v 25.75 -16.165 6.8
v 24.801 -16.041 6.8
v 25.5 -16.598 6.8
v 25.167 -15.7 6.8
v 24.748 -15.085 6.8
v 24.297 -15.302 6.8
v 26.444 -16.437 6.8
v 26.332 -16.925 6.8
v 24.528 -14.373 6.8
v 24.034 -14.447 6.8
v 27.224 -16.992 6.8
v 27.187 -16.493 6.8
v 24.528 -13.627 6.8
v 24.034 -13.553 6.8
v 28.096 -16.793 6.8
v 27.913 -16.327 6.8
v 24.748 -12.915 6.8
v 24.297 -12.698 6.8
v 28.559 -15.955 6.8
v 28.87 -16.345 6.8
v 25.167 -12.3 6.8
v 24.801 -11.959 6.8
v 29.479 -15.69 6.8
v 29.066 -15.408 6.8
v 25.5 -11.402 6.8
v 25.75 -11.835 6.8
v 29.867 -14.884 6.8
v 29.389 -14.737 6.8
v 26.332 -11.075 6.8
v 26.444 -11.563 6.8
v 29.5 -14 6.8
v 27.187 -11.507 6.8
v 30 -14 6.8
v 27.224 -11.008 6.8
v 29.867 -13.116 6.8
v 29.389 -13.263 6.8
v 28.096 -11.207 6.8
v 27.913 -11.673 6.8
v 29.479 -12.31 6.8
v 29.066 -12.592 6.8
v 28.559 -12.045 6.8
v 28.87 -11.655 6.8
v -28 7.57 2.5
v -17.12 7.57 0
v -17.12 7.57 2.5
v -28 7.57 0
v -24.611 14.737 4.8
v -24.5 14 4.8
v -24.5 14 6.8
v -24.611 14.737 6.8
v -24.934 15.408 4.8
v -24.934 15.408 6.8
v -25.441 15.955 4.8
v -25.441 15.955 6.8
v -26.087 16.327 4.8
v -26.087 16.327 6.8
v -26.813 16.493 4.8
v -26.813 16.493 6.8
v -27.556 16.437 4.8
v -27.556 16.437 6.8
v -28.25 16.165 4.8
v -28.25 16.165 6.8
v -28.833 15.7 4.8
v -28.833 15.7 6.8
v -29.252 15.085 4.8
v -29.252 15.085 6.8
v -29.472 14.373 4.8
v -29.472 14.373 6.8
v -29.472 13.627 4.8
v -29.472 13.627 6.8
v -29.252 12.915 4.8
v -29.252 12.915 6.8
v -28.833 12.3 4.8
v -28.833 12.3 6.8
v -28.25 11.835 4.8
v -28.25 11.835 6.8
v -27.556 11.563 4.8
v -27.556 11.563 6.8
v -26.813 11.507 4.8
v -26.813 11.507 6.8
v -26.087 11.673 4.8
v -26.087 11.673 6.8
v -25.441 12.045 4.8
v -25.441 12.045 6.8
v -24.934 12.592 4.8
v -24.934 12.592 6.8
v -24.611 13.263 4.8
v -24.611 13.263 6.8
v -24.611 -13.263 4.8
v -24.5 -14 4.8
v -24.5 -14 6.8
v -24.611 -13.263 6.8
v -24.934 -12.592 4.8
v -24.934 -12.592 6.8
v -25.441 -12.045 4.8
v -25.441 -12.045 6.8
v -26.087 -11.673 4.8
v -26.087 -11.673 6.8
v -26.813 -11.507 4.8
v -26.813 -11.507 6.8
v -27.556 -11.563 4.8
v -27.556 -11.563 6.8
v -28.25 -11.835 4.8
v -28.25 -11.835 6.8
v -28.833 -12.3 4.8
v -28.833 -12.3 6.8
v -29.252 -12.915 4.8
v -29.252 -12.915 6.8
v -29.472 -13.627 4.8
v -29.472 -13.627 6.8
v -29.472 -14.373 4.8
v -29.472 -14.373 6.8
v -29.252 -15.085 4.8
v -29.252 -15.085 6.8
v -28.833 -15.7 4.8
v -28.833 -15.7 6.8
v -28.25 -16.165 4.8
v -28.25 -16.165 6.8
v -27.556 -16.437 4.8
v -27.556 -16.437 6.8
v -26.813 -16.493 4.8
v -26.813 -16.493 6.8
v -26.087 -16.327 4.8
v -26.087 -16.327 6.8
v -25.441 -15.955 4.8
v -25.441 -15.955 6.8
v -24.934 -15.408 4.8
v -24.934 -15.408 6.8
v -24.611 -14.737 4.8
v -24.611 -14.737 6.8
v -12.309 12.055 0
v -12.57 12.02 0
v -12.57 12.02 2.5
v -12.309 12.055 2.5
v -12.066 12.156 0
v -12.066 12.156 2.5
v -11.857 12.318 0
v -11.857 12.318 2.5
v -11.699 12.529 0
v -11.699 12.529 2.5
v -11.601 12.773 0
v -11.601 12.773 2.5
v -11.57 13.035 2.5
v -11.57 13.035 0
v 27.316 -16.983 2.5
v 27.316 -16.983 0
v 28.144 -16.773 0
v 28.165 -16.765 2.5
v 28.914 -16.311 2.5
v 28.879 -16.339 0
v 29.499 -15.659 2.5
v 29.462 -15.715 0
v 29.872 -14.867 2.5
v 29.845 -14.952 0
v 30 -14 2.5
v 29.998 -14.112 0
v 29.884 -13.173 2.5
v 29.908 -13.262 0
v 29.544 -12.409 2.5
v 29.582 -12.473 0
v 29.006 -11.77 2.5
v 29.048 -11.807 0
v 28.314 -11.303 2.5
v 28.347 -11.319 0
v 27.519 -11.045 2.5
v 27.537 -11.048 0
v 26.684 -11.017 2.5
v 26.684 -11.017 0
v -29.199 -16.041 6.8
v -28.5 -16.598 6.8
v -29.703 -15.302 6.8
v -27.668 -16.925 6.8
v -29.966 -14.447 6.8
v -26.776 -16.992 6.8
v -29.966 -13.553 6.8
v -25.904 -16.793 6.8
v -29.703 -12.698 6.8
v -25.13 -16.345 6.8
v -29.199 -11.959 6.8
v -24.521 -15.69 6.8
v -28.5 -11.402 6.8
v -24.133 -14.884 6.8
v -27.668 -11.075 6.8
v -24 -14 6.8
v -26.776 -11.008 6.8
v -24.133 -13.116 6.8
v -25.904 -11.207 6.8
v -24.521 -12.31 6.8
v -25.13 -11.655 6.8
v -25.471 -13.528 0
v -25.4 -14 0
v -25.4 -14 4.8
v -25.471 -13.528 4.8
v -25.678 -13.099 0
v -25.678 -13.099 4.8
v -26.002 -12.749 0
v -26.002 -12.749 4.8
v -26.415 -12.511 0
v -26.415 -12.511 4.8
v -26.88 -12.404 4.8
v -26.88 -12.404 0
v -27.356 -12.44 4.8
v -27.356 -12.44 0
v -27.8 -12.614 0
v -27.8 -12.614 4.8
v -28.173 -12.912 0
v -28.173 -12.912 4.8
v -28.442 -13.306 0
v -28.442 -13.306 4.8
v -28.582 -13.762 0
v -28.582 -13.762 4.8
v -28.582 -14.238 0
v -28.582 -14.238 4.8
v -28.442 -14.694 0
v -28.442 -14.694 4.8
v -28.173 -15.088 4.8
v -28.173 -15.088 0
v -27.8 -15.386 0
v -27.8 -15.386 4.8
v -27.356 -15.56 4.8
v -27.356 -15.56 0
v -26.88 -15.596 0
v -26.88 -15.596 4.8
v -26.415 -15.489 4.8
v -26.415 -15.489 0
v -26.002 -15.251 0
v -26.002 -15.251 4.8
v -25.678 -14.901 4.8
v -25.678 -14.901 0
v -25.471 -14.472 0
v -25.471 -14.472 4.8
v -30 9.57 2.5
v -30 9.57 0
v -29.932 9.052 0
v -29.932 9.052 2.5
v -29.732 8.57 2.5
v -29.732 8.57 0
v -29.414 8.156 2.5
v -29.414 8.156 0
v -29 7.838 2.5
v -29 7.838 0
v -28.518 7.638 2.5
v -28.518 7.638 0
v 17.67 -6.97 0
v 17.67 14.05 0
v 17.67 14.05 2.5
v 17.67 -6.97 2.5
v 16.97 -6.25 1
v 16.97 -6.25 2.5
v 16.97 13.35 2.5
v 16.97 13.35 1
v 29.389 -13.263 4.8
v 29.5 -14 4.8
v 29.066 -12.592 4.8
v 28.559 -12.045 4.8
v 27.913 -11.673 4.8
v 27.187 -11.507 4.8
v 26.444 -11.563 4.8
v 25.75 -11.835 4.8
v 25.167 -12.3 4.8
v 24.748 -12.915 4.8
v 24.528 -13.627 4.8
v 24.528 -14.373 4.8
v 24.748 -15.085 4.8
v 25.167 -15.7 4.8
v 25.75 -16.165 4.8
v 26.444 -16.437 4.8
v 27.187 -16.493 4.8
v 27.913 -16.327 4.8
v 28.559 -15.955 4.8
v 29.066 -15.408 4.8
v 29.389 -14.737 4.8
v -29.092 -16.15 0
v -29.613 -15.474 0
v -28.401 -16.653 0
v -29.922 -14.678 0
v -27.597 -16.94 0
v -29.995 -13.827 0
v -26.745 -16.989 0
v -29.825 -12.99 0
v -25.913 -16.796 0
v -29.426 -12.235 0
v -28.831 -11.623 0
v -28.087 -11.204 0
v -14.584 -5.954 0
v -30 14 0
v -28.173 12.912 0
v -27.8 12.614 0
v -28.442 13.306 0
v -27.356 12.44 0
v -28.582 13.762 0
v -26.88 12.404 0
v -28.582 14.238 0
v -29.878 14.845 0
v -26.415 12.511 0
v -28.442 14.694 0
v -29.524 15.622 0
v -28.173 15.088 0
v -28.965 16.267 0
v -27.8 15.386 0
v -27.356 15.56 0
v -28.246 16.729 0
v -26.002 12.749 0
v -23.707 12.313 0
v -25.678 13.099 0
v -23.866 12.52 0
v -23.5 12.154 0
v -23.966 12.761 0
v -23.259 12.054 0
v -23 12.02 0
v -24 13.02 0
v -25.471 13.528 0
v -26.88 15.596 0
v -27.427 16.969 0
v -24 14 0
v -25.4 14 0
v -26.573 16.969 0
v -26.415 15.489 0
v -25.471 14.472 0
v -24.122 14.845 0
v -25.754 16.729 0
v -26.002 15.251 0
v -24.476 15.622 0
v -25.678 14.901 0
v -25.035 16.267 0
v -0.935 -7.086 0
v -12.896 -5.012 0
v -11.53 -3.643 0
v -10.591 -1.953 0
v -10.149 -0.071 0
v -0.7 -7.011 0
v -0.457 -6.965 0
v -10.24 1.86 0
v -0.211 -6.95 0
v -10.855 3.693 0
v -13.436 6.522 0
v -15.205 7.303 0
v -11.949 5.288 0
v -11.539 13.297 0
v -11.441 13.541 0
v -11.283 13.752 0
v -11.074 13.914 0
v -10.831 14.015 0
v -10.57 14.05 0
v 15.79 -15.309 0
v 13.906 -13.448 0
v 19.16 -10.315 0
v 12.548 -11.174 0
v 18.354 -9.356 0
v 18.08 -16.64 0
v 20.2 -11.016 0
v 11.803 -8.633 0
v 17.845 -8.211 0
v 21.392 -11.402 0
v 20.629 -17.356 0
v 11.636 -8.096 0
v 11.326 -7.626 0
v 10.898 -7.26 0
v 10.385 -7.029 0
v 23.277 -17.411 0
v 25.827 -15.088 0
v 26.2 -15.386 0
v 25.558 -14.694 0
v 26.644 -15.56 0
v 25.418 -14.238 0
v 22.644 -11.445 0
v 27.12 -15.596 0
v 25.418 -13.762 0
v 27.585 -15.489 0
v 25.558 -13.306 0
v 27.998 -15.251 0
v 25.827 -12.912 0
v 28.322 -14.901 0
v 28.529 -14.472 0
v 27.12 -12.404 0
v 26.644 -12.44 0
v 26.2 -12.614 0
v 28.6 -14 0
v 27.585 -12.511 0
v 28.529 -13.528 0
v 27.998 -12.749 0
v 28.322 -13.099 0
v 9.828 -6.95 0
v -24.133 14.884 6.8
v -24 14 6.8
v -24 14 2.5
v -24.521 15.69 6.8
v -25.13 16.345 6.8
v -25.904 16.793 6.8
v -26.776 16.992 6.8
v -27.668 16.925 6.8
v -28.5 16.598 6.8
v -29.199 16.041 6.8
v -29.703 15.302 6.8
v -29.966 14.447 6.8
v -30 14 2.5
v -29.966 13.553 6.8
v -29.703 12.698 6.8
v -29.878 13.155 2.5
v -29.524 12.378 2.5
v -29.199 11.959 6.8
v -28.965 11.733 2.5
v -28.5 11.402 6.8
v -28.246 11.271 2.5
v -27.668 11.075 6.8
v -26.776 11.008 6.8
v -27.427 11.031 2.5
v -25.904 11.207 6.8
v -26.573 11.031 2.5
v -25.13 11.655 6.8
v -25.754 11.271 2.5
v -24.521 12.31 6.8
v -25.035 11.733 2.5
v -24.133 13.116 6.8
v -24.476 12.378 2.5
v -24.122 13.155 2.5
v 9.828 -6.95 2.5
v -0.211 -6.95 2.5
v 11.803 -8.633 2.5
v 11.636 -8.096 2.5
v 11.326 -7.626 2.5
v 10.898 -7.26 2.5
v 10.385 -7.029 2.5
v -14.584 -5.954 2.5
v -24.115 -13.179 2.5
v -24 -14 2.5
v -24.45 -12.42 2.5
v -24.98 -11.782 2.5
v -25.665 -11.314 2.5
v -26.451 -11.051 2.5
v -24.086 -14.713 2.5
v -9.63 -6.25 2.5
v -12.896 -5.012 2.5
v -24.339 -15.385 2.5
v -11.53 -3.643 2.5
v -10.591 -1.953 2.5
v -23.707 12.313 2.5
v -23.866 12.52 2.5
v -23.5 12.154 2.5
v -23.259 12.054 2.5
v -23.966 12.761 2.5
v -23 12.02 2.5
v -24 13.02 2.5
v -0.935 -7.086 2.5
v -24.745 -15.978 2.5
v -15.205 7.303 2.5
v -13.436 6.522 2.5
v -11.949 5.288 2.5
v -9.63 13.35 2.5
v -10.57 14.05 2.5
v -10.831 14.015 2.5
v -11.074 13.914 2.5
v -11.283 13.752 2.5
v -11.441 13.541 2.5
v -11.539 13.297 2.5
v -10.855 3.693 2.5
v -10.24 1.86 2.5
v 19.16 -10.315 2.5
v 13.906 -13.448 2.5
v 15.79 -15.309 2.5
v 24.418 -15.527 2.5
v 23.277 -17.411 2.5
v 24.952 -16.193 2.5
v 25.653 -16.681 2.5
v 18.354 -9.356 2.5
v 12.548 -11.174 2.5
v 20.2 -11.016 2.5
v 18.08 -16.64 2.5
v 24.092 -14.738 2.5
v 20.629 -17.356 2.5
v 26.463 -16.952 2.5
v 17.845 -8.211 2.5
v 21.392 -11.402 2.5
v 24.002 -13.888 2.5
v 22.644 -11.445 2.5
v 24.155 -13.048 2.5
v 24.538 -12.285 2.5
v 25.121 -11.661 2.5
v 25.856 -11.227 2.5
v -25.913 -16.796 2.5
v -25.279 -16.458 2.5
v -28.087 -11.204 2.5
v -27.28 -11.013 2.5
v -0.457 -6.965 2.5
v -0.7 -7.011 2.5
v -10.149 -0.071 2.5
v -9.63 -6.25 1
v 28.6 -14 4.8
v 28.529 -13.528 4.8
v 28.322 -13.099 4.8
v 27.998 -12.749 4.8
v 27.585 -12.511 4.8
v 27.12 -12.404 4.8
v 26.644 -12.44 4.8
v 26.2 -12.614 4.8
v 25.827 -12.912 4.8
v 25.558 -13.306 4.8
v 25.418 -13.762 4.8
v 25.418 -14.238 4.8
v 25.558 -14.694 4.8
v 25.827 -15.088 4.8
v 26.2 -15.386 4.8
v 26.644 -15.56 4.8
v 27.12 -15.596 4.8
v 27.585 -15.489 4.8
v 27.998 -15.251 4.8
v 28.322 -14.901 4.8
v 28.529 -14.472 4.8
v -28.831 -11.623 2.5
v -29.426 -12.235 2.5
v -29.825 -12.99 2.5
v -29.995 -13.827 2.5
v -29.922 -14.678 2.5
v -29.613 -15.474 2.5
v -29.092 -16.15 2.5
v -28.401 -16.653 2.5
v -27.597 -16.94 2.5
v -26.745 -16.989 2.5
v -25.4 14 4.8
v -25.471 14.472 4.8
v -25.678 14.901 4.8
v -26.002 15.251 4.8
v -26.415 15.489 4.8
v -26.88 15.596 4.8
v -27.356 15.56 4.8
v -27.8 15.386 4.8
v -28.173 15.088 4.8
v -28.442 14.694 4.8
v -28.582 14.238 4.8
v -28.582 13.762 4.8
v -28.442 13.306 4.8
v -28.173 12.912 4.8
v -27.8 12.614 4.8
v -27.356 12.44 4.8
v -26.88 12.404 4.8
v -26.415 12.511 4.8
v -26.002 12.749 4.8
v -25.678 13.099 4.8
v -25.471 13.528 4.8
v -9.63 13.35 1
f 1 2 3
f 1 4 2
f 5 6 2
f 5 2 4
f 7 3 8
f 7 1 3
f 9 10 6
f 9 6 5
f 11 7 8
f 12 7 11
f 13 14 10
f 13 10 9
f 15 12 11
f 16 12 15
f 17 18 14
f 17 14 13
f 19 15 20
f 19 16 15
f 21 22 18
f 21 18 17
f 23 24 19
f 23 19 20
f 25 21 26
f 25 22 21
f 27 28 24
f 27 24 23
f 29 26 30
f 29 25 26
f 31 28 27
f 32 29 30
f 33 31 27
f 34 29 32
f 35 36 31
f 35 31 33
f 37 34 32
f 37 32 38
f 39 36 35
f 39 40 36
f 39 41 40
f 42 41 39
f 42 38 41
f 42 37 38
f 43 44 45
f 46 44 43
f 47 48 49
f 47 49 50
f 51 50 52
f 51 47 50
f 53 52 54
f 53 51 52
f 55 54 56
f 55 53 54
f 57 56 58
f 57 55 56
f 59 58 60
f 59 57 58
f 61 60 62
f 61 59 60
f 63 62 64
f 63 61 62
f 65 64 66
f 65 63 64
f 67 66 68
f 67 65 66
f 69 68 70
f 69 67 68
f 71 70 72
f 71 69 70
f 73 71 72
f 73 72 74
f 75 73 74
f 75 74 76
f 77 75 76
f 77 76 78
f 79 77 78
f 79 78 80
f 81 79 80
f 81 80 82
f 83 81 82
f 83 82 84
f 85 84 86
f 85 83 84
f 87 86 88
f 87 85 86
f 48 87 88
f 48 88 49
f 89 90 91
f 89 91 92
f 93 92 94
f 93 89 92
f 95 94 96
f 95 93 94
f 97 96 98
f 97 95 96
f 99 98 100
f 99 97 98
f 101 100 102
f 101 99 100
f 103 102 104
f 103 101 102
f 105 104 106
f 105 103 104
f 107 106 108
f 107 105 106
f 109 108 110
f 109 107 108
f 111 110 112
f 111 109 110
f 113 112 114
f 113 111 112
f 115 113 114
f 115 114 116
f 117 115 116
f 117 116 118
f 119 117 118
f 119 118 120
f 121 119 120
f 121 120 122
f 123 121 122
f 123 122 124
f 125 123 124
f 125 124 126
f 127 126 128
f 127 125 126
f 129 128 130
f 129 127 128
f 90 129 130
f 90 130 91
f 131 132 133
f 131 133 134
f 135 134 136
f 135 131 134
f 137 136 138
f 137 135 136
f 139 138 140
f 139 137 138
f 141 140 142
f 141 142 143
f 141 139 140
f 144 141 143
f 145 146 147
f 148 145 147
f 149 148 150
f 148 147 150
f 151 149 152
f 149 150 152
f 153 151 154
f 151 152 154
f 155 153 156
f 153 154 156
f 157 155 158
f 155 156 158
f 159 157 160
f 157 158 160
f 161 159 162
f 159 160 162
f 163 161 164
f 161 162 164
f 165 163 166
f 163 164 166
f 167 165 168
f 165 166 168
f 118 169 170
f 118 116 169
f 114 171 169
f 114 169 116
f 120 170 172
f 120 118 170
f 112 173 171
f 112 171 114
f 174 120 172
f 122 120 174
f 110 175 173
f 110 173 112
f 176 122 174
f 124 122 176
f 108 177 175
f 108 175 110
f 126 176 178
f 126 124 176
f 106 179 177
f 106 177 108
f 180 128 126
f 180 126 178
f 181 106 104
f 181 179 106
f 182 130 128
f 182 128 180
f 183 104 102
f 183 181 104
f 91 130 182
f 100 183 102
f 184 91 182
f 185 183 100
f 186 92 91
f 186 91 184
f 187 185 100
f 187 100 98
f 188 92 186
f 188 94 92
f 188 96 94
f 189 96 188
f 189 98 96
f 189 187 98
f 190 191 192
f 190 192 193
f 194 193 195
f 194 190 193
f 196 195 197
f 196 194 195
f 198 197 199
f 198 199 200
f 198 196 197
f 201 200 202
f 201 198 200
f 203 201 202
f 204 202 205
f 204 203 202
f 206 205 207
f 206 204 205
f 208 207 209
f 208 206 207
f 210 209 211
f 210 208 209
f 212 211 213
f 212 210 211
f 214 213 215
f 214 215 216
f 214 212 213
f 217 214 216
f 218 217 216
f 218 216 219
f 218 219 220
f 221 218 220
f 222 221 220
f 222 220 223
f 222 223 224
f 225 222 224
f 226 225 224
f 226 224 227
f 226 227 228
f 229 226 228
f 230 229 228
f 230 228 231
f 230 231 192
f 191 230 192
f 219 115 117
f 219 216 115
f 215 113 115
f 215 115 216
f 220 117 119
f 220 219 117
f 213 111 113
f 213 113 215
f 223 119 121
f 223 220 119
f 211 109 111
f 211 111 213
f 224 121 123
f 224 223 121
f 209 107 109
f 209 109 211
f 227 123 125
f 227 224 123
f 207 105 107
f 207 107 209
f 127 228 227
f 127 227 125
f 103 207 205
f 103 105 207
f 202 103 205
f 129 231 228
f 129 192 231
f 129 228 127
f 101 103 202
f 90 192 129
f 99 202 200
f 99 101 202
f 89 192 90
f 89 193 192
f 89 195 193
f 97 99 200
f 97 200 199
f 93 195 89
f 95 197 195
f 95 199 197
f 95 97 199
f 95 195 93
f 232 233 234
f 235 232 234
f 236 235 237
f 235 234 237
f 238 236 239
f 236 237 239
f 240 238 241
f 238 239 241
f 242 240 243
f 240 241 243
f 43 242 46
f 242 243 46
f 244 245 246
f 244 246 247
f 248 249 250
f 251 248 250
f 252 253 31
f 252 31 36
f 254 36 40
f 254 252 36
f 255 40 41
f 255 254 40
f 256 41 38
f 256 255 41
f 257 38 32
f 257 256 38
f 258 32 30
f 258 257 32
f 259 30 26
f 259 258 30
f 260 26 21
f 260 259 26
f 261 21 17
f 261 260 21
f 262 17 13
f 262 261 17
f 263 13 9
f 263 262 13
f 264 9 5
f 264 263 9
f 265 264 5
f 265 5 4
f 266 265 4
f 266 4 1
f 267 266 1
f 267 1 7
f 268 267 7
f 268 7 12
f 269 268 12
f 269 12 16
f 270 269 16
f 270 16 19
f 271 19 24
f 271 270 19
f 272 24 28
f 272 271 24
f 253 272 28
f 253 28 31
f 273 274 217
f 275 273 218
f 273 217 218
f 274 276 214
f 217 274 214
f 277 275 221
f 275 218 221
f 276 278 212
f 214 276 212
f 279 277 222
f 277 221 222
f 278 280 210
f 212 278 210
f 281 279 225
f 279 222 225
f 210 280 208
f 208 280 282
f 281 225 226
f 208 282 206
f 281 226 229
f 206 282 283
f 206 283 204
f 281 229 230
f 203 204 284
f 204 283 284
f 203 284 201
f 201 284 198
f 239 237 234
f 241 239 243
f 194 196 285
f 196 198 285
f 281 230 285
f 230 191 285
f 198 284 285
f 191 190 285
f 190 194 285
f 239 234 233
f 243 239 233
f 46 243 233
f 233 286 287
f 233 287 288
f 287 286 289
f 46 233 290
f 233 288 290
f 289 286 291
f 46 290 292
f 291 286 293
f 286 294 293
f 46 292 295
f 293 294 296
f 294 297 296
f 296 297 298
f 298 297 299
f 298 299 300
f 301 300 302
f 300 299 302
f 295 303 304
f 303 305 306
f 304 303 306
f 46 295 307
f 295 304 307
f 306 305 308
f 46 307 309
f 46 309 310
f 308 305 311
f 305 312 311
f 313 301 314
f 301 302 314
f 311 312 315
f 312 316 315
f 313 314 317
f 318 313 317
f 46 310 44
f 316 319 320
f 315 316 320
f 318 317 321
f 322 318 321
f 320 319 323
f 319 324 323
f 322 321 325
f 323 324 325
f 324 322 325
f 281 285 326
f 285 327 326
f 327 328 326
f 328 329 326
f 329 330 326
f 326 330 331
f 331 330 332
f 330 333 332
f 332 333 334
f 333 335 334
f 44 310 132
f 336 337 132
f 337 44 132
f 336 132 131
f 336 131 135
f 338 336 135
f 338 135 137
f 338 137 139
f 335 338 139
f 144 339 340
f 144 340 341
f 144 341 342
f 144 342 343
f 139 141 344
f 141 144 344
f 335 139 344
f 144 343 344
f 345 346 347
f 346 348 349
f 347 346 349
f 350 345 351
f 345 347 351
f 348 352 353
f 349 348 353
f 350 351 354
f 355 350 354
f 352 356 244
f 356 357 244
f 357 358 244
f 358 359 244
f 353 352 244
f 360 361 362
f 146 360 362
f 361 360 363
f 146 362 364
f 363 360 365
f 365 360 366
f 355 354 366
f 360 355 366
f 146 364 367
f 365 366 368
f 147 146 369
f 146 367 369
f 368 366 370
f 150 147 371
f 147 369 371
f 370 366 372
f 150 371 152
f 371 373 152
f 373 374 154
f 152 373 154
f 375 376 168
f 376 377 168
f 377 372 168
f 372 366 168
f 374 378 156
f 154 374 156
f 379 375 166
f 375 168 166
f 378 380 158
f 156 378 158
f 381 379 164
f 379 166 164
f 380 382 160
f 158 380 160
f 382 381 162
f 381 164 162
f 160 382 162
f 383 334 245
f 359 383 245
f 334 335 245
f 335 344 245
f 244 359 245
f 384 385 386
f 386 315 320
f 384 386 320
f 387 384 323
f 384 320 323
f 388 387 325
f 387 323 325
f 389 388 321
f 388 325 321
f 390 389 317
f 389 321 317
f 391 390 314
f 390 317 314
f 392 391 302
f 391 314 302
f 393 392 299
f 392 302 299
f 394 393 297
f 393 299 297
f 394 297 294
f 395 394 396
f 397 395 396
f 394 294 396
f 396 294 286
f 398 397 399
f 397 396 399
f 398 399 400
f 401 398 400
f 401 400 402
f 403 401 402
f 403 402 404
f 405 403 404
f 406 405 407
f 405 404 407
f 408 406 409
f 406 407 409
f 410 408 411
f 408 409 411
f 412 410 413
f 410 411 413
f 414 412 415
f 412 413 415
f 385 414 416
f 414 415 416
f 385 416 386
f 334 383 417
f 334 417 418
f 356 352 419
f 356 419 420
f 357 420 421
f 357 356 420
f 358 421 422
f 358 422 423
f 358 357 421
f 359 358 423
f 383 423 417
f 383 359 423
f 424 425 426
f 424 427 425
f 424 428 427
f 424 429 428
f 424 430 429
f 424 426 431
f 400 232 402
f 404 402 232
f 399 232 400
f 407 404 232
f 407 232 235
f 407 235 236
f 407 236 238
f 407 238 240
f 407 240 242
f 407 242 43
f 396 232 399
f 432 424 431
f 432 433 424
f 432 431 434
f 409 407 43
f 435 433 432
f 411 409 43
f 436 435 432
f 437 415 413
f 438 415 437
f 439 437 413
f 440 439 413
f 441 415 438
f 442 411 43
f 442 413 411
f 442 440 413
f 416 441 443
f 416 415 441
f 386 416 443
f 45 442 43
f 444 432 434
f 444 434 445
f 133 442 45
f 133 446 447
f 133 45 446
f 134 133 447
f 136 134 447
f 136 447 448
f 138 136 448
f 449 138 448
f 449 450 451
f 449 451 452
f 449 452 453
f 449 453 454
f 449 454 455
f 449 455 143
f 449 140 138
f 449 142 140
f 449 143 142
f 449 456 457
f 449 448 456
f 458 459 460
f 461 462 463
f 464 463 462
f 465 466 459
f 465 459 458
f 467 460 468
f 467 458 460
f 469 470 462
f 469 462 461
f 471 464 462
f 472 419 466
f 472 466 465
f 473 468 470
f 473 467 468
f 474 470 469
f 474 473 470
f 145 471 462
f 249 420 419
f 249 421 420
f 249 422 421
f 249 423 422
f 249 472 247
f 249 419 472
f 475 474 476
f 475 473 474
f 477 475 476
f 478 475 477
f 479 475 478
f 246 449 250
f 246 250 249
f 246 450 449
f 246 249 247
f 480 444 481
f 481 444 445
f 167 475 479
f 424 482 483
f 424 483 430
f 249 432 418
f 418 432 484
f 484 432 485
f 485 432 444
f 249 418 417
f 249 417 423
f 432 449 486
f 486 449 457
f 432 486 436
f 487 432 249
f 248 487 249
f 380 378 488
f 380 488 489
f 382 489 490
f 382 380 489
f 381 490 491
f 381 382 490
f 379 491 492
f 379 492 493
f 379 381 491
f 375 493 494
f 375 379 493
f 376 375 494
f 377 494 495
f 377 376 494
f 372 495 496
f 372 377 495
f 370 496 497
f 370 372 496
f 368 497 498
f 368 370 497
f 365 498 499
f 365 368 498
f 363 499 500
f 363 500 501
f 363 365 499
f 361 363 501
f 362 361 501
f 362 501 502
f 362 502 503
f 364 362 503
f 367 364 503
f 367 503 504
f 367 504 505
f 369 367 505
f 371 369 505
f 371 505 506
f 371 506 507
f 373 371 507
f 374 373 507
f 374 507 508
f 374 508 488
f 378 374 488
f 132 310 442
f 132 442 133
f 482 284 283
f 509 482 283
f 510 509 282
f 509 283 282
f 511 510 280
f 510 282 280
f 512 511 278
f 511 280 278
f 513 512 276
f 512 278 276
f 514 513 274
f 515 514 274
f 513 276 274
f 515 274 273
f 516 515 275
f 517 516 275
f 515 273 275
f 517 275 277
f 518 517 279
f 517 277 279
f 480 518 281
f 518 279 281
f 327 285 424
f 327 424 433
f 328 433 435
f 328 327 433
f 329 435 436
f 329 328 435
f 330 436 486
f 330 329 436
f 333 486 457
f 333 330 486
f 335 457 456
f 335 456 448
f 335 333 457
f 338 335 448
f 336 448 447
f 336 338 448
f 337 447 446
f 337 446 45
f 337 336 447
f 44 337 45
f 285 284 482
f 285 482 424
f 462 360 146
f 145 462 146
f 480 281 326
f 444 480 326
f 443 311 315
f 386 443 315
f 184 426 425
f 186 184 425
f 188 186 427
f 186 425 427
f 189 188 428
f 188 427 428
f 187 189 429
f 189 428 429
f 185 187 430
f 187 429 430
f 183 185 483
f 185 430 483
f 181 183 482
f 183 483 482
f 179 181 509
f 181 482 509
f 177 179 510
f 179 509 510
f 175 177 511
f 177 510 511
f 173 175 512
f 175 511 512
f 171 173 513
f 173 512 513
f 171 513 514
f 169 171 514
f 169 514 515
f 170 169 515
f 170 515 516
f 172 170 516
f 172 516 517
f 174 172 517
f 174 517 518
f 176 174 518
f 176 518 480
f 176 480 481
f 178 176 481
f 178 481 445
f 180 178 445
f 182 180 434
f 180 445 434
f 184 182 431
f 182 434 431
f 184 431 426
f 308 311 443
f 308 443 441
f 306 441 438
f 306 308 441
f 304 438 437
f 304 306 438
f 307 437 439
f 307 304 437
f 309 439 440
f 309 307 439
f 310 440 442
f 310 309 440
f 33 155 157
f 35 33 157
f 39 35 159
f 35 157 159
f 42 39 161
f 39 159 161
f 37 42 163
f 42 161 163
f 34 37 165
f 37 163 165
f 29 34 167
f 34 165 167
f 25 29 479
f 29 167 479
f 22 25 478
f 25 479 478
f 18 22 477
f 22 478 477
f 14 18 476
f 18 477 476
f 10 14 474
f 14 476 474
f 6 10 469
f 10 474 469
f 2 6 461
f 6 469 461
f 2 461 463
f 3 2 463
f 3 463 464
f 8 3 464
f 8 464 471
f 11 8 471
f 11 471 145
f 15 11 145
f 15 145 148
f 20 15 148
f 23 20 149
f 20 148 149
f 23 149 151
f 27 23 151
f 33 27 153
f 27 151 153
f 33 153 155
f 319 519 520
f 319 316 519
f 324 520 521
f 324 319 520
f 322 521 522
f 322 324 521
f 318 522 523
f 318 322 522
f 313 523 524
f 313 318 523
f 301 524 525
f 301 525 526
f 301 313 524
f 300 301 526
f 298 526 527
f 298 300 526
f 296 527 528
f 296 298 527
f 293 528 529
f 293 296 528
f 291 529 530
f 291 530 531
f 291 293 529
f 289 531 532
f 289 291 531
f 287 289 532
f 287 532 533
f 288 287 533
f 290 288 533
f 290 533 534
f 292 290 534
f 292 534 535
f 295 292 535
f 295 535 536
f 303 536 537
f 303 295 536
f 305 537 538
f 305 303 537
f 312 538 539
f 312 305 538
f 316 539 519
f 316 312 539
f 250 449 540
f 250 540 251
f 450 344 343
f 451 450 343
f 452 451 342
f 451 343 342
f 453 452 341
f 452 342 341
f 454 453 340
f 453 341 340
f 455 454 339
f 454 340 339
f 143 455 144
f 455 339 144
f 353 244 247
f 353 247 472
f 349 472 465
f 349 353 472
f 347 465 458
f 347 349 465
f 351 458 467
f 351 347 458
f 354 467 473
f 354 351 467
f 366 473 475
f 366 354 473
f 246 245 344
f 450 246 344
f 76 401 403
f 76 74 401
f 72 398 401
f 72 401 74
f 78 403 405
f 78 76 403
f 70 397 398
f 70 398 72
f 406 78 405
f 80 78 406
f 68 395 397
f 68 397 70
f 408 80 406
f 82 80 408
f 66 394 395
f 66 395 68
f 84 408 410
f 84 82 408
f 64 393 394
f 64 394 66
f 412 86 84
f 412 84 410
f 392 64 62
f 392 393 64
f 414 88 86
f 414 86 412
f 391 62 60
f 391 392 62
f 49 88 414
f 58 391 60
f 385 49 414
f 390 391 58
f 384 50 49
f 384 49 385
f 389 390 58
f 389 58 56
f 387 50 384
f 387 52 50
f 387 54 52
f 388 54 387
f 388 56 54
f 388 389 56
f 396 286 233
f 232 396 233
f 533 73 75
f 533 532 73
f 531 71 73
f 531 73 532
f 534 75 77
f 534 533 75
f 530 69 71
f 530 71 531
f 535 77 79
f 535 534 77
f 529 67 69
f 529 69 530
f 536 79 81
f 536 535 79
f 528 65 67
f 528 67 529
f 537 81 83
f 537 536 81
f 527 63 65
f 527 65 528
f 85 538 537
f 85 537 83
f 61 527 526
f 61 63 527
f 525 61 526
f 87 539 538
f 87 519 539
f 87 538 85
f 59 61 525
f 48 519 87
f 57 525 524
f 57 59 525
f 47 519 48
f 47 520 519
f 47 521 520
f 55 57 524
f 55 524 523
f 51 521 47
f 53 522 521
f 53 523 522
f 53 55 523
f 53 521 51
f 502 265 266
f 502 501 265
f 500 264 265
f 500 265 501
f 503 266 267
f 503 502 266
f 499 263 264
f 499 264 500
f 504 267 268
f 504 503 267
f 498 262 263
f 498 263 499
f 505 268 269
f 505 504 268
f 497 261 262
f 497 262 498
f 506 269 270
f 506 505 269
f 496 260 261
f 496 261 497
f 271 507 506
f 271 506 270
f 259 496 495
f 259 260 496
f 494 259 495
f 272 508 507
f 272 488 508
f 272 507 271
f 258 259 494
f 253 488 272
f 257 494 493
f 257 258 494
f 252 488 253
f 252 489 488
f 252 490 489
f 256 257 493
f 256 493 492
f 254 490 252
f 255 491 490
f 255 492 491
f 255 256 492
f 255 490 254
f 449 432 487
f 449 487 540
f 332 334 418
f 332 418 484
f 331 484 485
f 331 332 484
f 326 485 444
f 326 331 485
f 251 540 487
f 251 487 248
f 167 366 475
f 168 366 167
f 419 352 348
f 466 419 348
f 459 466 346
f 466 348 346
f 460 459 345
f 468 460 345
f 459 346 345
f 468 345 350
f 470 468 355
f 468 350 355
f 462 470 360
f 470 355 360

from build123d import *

# Parameters (mm, degrees)
SKETCH003_R   = 1.6
PAD_DEPTH     = 2.5
SKETCH_R      = 3
SKETCH_R_2    = 1.6
PAD001_DEPTH  = 2.3
SKETCH004_R   = 3
SKETCH004_R_2 = 2.5
PAD002_DEPTH  = 2
SKETCH005_W   = 26.6
SKETCH005_H   = 19.6
POCKET_DEPTH  = 1.5


with BuildPart() as part:
    # Sketch003 → Pad (new body)
    with BuildSketch(Plane.XY):
        with BuildLine():
            ThreePointArc((-28.087018, -11.203861), (-29.796139, -15.087018), (-25.912982, -16.796139))
            Line((-25.912982, -16.796139), (-0.93534, -7.085908))
            ThreePointArc((-0.210661, -6.95), (-0.579317, -6.984271), (-0.93534, -7.085908))
            Line((9.827812, -6.95), (-0.210661, -6.95))
            ThreePointArc((11.802562, -8.6332), (11.125194, -7.427896), (9.827812, -6.95))
            ThreePointArc((11.802562, -8.6332), (15.79003, -15.309423), (23.276895, -17.411493))
            Line((23.276895, -17.411493), (27.316256, -16.983284))
            ThreePointArc((27.316256, -16.983284), (29.983284, -13.683744), (26.683744, -11.016716))
            Line((22.644383, -11.444926), (26.683744, -11.016716))
            ThreePointArc((17.67, -6.97), (19.160409, -10.315499), (22.644383, -11.444926))
            Line((17.67, 14.05), (17.67, -6.97))
            Line((17.67, 14.05), (-10.570113, 14.05))
            ThreePointArc((-10.570113, 14.05), (-11.282503, 13.751783), (-11.57, 13.035))
            ThreePointArc((-12.569887, 12.02), (-11.857497, 12.318217), (-11.57, 13.035))
            Line((-23, 12.02), (-12.569887, 12.02))
            ThreePointArc((-24, 13.02), (-23.707107, 12.312893), (-23, 12.02))
            Line((-24, 13.02), (-24, 14))
            ThreePointArc((-24, 14), (-27, 17), (-30, 14))
            Line((-30, 14), (-30, 9.57))
            ThreePointArc((-30, 9.57), (-29.414214, 8.155786), (-28, 7.57))
            Line((-17.12, 7.57), (-28, 7.57))
            ThreePointArc((-14.583624, -5.954324), (-10.239947, 1.860298), (-17.12, 7.57))
            Line((-28.087018, -11.203861), (-14.583624, -5.954324))
        make_face()
        with Locations((-27, 14)):
            Circle(SKETCH003_R, mode=Mode.SUBTRACT)
        with Locations((27, -14)):
            Circle(SKETCH003_R, mode=Mode.SUBTRACT)
        with Locations((-27, -14)):
            Circle(SKETCH003_R, mode=Mode.SUBTRACT)
    extrude(amount=PAD_DEPTH)

    # Sketch → Pad001 (new body)
    with BuildSketch(Plane.XY.offset(2.5)):
        with Locations((-27, 14)):
            Circle(SKETCH_R)
        with Locations((-27, 14)):
            Circle(SKETCH_R_2, mode=Mode.SUBTRACT)
        with Locations((27, -14)):
            Circle(SKETCH_R)
        with Locations((27, -14)):
            Circle(SKETCH_R_2, mode=Mode.SUBTRACT)
        with Locations((-27, -14)):
            Circle(SKETCH_R)
        with Locations((-27, -14)):
            Circle(SKETCH_R_2, mode=Mode.SUBTRACT)
    extrude(amount=PAD001_DEPTH)

    # Sketch004 → Pad002 (new body)
    with BuildSketch(Plane.XY.offset(4.8)):
        with Locations((-27, 14)):
            Circle(SKETCH004_R)
        with Locations((-27, 14)):
            Circle(SKETCH004_R_2, mode=Mode.SUBTRACT)
        with Locations((-27, -14)):
            Circle(SKETCH004_R)
        with Locations((-27, -14)):
            Circle(SKETCH004_R_2, mode=Mode.SUBTRACT)
        with Locations((27, -14)):
            Circle(SKETCH004_R)
        with Locations((27, -14)):
            Circle(SKETCH004_R_2, mode=Mode.SUBTRACT)
    extrude(amount=PAD002_DEPTH)

    # Sketch005 → Pocket (cut)
    with BuildSketch(Plane.XY.offset(2.5)):
        with Locations((3.67, 3.55)):
            Rectangle(SKETCH005_W, SKETCH005_H)
    extrude(amount=-POCKET_DEPTH, mode=Mode.SUBTRACT)


solid = part.part
